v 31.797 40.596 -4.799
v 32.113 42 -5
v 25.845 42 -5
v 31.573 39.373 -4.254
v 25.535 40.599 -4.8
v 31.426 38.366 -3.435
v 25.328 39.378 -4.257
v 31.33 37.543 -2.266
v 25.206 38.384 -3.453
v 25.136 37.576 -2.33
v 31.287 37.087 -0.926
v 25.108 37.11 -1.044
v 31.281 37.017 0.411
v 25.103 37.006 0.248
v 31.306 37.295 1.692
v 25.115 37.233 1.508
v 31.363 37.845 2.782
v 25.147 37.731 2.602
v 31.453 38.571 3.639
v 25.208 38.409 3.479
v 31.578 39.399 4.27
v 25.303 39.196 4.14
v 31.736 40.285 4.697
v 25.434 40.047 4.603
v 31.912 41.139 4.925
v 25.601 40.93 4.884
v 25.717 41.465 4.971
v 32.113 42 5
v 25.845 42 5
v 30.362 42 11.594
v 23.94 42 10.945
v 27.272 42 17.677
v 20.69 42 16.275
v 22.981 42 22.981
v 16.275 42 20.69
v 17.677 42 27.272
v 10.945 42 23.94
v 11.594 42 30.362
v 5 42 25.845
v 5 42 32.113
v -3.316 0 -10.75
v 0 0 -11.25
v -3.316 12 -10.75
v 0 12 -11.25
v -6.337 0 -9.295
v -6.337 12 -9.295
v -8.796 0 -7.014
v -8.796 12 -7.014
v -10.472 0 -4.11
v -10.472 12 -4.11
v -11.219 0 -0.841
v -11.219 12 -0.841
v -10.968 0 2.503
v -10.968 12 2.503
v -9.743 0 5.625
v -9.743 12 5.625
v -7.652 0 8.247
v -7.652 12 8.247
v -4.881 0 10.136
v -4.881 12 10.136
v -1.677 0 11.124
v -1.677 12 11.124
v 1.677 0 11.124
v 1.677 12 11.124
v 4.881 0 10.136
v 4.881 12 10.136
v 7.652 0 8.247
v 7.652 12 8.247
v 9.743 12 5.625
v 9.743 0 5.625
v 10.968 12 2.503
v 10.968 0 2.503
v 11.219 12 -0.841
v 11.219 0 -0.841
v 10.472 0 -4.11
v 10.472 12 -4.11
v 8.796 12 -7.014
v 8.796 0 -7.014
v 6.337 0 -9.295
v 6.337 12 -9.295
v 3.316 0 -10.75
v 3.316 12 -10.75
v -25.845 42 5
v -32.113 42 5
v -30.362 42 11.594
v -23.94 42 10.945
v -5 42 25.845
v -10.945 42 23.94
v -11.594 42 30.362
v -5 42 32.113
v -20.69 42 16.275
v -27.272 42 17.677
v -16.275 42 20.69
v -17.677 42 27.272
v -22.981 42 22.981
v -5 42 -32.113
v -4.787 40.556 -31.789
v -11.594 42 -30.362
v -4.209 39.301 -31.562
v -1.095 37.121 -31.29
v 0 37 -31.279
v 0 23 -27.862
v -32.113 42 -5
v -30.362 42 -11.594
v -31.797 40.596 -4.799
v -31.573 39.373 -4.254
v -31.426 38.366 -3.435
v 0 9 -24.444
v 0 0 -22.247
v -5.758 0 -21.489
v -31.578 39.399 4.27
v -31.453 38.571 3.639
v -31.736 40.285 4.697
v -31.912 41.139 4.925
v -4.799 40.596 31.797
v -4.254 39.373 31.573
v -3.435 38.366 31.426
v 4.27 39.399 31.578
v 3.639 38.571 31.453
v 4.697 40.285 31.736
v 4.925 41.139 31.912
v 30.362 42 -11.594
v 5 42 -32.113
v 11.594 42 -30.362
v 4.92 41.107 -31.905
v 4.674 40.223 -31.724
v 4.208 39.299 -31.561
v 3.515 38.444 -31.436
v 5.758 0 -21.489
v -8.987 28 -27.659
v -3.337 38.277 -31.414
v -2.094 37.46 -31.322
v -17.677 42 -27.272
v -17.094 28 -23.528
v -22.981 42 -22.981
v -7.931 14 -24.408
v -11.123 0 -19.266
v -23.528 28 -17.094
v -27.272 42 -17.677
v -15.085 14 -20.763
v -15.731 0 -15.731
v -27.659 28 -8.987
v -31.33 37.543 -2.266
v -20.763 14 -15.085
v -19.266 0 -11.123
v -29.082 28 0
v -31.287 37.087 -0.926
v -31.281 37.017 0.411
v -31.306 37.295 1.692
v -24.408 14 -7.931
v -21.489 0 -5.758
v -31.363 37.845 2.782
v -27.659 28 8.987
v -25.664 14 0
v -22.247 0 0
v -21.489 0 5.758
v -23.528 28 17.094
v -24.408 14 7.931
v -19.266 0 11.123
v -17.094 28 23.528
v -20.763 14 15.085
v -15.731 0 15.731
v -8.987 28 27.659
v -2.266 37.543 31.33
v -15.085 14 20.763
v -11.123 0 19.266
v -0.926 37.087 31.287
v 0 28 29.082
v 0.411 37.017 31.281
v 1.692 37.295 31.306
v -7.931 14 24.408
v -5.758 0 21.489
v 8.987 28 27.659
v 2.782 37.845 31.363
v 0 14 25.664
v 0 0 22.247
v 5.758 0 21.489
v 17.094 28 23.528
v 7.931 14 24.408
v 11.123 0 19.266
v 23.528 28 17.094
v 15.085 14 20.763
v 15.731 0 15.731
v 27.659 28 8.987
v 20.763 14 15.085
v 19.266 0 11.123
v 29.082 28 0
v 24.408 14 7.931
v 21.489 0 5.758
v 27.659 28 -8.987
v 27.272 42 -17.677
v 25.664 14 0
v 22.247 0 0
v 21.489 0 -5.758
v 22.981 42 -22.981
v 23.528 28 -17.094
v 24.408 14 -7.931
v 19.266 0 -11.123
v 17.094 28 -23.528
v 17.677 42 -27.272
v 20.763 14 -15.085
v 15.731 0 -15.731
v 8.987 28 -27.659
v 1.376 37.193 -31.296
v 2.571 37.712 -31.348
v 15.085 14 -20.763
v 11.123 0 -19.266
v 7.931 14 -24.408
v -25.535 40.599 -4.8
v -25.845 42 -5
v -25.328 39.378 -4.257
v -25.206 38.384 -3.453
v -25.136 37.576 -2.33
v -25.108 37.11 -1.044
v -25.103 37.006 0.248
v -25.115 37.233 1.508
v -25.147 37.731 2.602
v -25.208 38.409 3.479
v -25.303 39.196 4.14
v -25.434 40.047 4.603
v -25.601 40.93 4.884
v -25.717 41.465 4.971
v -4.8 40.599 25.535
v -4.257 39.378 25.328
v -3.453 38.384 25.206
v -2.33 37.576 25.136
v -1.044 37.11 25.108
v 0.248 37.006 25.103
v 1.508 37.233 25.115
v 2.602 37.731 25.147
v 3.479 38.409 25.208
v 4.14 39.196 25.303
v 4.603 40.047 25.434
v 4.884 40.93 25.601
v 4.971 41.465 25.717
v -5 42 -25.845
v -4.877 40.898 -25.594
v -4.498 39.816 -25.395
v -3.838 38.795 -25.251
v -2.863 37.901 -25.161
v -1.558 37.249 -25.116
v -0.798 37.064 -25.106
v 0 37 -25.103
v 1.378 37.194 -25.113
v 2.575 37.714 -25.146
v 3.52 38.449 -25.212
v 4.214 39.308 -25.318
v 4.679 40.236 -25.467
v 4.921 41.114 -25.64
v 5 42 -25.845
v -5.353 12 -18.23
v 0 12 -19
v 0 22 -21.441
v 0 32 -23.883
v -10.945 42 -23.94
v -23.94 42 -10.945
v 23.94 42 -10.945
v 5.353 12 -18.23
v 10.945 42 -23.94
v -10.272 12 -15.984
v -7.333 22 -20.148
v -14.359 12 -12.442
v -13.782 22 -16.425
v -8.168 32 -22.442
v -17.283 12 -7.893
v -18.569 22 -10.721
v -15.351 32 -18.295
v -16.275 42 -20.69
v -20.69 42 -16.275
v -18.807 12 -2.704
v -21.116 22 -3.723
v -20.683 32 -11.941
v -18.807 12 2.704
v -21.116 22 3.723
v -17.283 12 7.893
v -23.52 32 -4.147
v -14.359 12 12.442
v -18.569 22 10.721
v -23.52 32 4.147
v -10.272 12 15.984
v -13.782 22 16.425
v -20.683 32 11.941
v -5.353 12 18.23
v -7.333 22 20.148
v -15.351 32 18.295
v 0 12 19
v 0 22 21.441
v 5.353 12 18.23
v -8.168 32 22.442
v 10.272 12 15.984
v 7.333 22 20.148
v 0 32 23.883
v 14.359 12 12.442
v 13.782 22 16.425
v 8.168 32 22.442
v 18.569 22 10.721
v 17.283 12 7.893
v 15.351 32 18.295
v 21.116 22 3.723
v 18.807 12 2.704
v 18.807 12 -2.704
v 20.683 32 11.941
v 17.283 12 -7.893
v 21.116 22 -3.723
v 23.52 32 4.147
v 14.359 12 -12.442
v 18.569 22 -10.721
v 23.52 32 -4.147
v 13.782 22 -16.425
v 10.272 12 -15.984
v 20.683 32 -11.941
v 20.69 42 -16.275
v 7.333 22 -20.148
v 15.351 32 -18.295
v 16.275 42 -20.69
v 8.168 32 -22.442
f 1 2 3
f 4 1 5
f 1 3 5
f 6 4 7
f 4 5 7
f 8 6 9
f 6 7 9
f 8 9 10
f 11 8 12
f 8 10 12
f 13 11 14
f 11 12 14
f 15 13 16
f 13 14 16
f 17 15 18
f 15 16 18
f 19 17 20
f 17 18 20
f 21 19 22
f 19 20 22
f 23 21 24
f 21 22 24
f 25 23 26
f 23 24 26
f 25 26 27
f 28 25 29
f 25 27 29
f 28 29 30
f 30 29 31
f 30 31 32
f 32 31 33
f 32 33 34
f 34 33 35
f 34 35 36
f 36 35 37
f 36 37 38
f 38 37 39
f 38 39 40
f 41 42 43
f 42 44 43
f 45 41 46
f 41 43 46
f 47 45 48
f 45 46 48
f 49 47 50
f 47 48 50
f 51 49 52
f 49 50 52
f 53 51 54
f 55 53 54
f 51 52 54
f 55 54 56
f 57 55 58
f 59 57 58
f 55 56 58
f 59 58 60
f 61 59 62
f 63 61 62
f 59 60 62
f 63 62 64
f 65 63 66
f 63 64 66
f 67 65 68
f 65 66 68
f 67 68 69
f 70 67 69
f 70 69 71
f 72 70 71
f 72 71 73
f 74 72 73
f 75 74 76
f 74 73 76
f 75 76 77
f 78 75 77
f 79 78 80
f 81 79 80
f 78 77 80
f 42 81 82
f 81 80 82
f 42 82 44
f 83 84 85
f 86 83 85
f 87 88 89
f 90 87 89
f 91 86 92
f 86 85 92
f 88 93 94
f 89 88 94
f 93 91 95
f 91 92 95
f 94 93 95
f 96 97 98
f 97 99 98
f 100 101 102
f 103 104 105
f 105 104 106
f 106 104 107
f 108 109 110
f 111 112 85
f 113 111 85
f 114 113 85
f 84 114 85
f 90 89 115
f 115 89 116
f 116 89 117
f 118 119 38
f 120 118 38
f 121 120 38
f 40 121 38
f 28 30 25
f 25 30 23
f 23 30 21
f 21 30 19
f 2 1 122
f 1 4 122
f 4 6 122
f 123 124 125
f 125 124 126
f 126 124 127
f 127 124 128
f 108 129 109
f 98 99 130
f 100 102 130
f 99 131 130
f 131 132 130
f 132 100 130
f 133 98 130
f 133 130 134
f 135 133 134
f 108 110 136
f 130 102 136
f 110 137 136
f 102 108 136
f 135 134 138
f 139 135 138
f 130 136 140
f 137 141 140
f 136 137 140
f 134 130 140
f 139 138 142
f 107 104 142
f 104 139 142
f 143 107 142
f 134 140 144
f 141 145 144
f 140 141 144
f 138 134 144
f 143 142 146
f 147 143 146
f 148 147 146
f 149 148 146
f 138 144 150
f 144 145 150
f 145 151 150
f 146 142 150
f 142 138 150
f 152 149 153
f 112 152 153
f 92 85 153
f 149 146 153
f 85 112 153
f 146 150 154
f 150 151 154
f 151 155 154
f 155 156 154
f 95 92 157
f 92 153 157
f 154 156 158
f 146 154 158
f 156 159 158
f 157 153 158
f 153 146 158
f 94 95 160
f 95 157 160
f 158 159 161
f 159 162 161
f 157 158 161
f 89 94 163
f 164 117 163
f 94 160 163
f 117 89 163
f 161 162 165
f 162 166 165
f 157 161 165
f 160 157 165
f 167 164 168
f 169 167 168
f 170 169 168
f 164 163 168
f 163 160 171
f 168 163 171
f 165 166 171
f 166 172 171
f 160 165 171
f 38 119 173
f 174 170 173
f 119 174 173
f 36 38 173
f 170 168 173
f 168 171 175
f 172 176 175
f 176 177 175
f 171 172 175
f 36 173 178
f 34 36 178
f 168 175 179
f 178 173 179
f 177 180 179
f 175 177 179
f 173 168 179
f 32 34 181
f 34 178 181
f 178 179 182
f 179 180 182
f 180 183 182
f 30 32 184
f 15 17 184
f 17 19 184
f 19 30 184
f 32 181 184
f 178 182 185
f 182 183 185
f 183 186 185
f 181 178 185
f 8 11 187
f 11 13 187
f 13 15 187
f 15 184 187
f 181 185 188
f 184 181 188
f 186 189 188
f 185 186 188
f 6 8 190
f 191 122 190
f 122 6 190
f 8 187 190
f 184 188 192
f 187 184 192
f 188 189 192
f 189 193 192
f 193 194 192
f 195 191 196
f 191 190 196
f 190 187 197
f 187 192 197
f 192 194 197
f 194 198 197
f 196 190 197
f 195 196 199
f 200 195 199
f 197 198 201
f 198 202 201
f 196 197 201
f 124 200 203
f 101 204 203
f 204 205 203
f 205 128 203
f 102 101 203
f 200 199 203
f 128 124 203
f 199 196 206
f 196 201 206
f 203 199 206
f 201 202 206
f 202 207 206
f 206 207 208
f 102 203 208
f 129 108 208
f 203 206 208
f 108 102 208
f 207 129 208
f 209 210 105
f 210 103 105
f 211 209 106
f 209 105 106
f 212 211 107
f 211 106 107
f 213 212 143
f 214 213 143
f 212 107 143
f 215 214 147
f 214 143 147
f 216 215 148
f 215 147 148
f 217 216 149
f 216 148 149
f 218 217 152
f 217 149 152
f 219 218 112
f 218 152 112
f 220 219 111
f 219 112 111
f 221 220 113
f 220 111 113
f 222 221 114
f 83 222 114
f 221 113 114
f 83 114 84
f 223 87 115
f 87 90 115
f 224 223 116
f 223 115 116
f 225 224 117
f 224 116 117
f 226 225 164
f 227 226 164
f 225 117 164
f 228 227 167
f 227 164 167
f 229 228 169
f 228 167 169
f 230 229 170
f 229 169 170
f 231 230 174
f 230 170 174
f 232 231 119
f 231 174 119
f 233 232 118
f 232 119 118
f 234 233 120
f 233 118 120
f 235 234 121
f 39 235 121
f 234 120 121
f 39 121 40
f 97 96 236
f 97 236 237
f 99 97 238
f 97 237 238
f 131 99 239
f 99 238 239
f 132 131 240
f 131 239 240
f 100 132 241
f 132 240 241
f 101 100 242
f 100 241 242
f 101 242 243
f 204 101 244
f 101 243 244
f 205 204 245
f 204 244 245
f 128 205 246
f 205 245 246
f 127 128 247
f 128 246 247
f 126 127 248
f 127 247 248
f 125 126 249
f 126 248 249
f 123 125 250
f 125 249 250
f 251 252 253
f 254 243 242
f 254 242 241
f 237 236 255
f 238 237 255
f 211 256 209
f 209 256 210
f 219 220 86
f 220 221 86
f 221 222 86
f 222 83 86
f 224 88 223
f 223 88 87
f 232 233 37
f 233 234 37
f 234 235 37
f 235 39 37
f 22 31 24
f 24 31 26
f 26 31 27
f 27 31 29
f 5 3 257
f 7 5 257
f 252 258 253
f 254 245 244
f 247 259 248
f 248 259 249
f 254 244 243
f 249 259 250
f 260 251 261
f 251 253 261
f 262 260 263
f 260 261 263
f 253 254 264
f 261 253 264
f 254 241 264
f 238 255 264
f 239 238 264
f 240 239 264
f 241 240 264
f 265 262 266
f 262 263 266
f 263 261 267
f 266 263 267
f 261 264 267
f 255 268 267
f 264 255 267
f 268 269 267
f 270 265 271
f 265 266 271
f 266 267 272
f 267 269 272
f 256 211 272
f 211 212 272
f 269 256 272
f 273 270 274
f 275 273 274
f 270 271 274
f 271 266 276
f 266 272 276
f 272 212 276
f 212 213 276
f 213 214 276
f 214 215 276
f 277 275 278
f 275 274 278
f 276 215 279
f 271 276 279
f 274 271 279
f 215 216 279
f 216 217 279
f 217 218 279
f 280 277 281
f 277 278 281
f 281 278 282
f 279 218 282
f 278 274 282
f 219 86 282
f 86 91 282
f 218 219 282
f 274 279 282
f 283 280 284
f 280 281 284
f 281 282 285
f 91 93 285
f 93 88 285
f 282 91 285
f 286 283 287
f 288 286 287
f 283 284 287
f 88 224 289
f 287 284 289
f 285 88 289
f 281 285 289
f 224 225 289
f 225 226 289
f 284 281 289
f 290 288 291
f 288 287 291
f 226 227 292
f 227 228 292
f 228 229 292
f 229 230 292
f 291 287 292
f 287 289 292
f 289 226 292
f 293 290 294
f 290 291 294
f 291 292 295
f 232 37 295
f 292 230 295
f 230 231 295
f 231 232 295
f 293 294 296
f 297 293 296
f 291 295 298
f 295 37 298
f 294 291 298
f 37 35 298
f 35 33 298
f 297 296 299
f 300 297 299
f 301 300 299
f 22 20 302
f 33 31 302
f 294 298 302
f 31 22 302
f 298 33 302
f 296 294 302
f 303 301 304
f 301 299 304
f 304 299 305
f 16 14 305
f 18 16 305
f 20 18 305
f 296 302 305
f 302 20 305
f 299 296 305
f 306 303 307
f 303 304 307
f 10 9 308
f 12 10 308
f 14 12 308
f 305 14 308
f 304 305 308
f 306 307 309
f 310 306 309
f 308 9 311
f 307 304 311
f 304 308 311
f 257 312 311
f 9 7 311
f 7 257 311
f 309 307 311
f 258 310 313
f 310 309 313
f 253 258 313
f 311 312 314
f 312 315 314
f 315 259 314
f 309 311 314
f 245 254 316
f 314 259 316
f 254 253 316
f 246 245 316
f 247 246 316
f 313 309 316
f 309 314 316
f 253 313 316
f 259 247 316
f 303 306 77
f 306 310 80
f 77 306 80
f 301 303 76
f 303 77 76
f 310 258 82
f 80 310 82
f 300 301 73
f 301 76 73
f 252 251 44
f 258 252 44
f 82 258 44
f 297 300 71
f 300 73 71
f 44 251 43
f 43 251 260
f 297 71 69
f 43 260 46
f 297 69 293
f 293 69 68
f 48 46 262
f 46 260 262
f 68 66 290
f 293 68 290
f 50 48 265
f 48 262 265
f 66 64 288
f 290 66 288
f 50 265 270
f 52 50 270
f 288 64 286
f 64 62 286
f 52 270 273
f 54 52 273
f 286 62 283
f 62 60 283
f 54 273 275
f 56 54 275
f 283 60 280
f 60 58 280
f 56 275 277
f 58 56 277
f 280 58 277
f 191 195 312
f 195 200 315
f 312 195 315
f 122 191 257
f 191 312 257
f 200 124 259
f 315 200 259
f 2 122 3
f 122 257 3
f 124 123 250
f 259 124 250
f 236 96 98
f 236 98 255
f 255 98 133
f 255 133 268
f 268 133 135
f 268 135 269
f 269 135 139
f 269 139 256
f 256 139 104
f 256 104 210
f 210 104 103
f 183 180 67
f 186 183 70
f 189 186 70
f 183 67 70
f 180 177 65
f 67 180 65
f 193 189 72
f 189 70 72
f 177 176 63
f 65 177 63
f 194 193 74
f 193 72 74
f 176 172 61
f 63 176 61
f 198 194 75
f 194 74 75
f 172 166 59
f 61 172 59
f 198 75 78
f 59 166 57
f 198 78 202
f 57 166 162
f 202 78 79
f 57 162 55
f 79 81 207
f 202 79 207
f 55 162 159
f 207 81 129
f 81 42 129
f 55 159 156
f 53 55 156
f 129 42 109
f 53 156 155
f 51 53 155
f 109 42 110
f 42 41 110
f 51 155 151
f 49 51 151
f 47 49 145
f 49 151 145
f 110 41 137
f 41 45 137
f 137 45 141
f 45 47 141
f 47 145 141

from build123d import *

# Parameters (mm, degrees)
SKETCH3_R          = 5
CUT_EXTRUDE1_DEPTH = 63.261545114
CIRPATTERN1_COUNT  = 4


with BuildPart() as part:
    # Sketch2 → Revolve1 (revolve)
    with BuildSketch(Plane.XY, mode=Mode.PRIVATE) as revolve1_sk:
        Polygon((11.25, 0), (11.25, 12), (19, 12), (26.323794171, 42), (32.5, 42), (22.246688161, 0), align=None)
    revolve(revolve1_sk.sketch.rotate(Axis((0, 0, 0), (0, 1, 0)), 90), axis=Axis((0, 0, 0), (0, 1, 0)))

    # Sketch3 → Cut-Extrude1 (cut, symmetric)
    with BuildSketch(Plane.XY):
        with Locations((0, 42)):
            Circle(SKETCH3_R)
    cut_extrude1 = extrude(amount=CUT_EXTRUDE1_DEPTH, both=True, mode=Mode.SUBTRACT)

    # CirPattern1: Cut-Extrude1 ×4 about axis
    cirpattern1_axis = Axis((0, 0, 0), (0, -1, 0))
    for i in range(1, CIRPATTERN1_COUNT):
        add(cut_extrude1.rotate(cirpattern1_axis, i * 360 / CIRPATTERN1_COUNT), mode=Mode.SUBTRACT)


solid = part.part
